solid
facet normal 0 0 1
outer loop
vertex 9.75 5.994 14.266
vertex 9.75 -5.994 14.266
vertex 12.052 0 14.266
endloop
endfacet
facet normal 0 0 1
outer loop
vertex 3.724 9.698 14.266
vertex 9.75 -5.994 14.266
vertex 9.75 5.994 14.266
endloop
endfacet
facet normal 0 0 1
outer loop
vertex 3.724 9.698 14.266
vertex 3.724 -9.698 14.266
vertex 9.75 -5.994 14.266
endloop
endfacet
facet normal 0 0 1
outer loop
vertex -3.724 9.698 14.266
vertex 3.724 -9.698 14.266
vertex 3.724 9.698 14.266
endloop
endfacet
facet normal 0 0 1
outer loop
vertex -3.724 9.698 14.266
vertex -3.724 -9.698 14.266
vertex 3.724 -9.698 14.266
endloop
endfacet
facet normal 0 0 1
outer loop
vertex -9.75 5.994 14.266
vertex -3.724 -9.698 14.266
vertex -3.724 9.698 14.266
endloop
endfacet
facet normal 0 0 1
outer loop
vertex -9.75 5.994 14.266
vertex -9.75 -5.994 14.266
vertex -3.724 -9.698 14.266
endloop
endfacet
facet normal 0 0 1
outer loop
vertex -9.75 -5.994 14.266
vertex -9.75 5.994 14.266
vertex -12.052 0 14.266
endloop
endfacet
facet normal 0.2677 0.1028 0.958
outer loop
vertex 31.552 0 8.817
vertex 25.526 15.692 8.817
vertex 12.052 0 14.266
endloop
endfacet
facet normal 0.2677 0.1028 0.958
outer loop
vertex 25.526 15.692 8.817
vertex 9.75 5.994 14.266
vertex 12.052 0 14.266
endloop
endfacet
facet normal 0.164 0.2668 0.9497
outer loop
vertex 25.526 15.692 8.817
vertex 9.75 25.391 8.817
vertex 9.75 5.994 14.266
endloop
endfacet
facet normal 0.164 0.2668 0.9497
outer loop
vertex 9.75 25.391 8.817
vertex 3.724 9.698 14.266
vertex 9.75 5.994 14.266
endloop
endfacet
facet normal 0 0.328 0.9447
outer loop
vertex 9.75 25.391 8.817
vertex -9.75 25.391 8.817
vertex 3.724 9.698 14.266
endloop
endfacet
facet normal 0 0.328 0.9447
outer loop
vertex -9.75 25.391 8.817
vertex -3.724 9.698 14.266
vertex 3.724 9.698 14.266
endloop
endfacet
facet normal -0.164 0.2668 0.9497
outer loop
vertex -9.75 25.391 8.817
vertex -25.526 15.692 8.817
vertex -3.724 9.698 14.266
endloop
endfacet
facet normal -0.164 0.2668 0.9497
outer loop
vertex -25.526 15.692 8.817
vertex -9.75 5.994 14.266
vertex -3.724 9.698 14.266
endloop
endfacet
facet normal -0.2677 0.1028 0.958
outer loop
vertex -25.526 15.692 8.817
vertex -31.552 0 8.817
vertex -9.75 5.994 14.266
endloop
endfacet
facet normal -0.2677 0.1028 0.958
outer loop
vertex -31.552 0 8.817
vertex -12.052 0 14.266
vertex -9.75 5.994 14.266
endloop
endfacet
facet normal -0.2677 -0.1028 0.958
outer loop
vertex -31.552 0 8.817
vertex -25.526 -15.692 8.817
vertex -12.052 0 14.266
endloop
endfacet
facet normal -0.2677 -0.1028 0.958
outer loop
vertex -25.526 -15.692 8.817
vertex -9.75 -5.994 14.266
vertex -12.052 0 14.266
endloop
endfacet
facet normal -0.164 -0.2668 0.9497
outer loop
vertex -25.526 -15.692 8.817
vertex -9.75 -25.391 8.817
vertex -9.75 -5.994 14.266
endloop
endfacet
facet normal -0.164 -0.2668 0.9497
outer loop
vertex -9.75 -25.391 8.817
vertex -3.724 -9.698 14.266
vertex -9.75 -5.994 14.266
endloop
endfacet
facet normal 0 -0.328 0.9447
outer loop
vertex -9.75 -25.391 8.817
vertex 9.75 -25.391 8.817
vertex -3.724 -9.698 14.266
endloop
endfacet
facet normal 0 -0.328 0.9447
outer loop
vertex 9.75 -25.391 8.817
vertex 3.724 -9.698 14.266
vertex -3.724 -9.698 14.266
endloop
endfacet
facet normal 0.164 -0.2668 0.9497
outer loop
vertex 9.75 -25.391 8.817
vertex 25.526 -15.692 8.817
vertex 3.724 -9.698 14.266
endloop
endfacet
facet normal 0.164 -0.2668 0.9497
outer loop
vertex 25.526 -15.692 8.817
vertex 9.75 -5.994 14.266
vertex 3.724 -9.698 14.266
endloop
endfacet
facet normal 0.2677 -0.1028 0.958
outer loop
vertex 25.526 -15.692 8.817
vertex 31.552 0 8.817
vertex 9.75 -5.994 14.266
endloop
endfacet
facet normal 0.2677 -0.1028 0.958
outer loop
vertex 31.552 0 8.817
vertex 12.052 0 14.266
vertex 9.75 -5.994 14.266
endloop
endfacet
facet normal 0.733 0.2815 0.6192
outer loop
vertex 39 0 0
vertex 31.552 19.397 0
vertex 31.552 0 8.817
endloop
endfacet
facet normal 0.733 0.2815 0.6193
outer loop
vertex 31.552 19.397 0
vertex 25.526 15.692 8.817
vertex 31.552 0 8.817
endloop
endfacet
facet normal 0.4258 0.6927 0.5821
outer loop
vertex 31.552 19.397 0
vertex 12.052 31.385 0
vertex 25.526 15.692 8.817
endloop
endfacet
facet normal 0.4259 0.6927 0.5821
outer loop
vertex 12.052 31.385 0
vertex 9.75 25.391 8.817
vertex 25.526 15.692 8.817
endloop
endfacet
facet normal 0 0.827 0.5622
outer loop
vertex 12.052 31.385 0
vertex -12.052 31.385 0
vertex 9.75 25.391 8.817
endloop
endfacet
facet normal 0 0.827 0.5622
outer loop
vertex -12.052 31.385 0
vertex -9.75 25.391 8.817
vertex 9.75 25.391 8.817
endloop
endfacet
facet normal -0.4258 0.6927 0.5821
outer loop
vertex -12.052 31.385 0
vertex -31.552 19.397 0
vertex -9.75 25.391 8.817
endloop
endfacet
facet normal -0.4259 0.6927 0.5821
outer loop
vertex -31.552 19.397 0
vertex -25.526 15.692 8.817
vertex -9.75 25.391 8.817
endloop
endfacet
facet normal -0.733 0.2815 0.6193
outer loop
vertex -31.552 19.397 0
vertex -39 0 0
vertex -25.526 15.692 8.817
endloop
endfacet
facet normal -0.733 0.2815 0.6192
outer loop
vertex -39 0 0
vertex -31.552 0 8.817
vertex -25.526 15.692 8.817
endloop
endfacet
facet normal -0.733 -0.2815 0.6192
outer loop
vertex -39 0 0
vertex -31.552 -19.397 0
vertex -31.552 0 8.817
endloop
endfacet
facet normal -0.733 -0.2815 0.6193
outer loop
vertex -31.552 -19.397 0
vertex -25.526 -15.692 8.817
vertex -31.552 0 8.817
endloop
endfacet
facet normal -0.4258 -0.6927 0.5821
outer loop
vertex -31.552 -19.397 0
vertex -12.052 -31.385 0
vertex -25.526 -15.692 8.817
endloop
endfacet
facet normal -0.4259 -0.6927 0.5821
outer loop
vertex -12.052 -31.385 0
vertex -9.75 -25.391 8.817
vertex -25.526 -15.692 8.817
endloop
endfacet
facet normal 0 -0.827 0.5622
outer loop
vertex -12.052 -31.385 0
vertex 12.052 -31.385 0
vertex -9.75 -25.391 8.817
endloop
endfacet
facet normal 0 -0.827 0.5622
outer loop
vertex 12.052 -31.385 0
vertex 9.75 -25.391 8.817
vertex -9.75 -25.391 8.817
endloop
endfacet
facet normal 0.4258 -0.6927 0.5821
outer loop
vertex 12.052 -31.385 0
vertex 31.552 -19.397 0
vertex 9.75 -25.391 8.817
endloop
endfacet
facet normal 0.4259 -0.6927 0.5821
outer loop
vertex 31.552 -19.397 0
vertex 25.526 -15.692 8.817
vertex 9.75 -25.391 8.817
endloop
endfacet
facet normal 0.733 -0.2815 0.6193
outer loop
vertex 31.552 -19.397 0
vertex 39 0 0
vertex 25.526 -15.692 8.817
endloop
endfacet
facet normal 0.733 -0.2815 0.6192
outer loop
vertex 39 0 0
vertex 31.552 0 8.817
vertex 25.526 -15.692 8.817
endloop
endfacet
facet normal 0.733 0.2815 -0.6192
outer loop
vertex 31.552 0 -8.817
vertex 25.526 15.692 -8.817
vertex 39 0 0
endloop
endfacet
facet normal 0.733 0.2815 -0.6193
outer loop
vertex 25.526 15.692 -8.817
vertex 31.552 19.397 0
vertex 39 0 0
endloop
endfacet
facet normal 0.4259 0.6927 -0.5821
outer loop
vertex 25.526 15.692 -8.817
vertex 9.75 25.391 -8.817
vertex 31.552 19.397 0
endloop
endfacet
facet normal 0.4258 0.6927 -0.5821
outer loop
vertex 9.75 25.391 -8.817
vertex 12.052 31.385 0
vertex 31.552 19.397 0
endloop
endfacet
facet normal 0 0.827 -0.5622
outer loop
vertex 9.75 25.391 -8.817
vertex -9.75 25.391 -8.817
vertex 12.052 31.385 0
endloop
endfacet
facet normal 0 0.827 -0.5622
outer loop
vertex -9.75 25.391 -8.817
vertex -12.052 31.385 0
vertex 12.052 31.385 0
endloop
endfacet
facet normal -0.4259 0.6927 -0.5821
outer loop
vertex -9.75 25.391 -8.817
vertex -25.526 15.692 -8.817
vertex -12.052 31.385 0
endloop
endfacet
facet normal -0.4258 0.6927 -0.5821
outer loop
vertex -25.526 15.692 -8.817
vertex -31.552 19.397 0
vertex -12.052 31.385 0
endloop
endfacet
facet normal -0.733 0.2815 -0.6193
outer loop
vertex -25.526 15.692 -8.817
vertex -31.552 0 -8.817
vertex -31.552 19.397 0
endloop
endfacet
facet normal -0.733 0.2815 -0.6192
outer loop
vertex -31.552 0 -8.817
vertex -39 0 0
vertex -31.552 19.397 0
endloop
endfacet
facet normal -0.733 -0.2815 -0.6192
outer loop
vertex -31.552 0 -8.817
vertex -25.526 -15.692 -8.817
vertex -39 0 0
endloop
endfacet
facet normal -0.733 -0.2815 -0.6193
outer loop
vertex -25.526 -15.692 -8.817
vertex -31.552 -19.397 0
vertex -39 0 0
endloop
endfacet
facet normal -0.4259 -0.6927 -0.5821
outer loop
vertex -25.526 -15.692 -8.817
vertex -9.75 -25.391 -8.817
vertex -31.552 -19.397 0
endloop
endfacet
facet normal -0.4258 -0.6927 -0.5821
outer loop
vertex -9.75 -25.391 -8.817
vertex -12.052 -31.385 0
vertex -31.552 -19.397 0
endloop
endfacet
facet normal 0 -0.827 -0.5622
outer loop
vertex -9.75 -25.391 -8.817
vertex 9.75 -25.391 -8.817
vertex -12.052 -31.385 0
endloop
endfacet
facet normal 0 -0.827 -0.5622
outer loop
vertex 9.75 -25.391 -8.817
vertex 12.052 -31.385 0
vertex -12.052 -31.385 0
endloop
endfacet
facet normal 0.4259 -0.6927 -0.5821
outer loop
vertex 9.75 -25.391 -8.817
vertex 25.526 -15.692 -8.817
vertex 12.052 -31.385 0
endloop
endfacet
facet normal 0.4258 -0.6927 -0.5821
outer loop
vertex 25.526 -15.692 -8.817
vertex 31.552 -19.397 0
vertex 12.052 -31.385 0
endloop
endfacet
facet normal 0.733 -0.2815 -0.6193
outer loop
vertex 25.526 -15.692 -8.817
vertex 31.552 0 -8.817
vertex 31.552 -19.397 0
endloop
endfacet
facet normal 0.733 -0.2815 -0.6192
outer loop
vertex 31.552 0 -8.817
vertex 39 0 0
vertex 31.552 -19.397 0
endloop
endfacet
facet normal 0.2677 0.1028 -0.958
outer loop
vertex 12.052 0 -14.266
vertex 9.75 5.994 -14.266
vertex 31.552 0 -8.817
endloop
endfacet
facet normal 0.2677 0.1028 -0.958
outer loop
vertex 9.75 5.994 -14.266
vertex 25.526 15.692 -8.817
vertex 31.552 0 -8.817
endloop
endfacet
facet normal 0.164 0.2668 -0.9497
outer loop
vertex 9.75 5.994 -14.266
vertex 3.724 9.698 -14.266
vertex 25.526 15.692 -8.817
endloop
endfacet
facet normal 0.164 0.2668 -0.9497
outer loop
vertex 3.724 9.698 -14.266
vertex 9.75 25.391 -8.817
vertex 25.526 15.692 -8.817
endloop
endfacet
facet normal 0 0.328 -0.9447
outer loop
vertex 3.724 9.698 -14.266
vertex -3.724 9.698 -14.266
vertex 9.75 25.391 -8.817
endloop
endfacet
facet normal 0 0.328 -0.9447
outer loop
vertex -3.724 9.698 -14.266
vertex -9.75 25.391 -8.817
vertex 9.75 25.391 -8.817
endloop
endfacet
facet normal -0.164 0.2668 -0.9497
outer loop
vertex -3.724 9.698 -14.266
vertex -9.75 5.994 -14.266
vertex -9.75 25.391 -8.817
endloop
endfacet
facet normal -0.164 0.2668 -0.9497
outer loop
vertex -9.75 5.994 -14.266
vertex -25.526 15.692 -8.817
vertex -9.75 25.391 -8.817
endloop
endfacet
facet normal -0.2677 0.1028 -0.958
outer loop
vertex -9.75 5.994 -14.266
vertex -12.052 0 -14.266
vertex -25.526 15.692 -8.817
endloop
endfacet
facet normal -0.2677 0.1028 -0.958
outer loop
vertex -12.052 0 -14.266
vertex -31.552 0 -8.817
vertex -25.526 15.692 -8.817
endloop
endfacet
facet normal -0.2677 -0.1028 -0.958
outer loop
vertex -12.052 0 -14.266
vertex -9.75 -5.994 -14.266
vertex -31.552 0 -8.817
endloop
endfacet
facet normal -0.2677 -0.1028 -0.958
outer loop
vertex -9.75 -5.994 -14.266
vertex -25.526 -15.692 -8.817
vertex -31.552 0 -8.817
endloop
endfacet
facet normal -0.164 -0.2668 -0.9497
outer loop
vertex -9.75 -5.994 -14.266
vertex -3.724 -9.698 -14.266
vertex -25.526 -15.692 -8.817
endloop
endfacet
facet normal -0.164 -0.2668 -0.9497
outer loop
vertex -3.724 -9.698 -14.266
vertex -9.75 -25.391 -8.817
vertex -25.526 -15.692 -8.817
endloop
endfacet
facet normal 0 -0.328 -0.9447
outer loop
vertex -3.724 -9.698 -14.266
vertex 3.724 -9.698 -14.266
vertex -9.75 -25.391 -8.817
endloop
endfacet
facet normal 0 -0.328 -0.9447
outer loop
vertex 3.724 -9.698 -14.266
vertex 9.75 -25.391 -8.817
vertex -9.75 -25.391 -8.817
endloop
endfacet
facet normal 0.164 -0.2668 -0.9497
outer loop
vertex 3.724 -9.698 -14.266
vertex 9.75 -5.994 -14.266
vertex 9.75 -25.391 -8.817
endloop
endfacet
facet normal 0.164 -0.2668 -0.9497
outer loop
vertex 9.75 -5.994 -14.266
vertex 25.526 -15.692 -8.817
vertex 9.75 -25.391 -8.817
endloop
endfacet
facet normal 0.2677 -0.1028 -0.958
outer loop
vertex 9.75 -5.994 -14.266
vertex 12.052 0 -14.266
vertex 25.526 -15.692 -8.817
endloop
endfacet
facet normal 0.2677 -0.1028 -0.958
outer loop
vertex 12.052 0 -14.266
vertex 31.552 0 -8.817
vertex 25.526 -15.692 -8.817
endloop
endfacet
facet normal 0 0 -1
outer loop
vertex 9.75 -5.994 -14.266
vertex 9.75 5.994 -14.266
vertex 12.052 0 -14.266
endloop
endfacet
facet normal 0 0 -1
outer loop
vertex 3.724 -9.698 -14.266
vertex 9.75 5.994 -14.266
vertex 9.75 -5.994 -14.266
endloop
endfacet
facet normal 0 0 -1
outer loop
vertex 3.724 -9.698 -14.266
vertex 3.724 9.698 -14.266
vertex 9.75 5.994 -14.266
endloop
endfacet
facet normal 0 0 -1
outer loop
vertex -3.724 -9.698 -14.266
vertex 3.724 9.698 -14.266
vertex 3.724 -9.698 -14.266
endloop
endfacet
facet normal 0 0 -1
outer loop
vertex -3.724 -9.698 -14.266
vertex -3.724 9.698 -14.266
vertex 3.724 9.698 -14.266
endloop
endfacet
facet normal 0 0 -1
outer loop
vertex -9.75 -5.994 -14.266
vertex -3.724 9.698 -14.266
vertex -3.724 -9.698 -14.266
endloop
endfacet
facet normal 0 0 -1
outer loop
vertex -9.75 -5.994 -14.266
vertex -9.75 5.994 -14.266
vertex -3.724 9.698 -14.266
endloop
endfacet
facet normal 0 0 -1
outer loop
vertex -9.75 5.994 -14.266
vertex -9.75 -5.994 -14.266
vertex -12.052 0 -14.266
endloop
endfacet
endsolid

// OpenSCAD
// Generated by SolidPython 1.0.1 on 2020-07-29 00:46:50


scale(v = [13, 11, 5]) {
	sphere(r = 3);
}
/***********************************************
*********      SolidPython code:      **********
************************************************
 
# import packages: SolidPython
from solid import *
from solid.utils import *
from itertools import chain, combinations, permutations


class Resize:

    def __init__(self, scad_file):
        self.scad_file = scad_file
        #self.scad_file = import_scad(scad_file)
        # cone/cylinder param:
        self.r1 = 0
        self.r2 = 0
        self.h = 0
        # rectangular prism param:
        self.w = 0
        self.l = 0
        # ellipse param:
        self.r = 0

    # import OpenScad code (file name corresponds to shape)


    # classify shape + parameters
    def assign(self, param1, param2, param3):
        if self.scad_file == 'cone.scad':
            self.r1 = param1
            self.r2 = param2
            self.h = param3
        elif self.scad_file == 'cylinder.scad':
            self.r1 = param1
            self.r2 = param2
            self.h = param3
        elif self.scad_file == 'rectangularPrism.scad':
            self.h = param1
            self.l = param2
            self.w = param3
        else:
            self.r = param1
            self.h = param2

    # resize parameters
    def iterate(self):
        x = range(3, 20, 2)
        i = 1
        if self.scad_file == 'cone.scad':
            tempList = list(permutations(x, 2))
            for temp in tempList:
                param1 = temp[0]
                param2 = temp[1]
                filepath = 'produced_scad_files/' + 'cone' + str(param1) + '_' + str(param2) + '_' + '.scad'
                scad_render_to_file(cylinder(h=param1, r1=param2, r2=0), filepath)

        elif self.scad_file == 'cylinder.scad':
            tempList = list(permutations(x, 3))
            for temp in tempList:
                param1 = temp[0]
                param2 = temp[1]
                filepath = 'produced_scad_files/' + 'cylinder' + str(param1) + '_' + str(param2) + '_' + '.scad'
                scad_render_to_file(cylinder(h=param1, r1=param2, r2=param2), filepath)

        elif self.scad_file == 'rectangularPrism.scad':
            tempList = list(permutations(x, 3))
            for temp in tempList:
                param1 = temp[0]
                param2 = temp[1]
                param3 = temp[2]
                filepath = 'produced_scad_files/' + 'rectangularPrism' + str(param1) + '_' + str(param2) + '_' + str(
                    param3) + '.scad'
                scad_render_to_file(cube(size=(param1, param2, param3)), filepath)

        elif self.scad_file == 'ellipse.scad':
            tempList = list(permutations(x, 4))
            for temp in tempList:
                param1 = temp[0]
                param2 = temp[1]
                param3 = temp[2]
                param4 = temp[3]
                filepath = 'produced_scad_files/' + 'ellipse' + str(param1) + '_' + str(param2) + '_' + str(param3) + '_' + str(param4) + '.scad'
                scad_render_to_file(scale([param1, param2, param3])(sphere(r=param4)), filepath)

    def render_to_scadfile(self):
        scad_render_to_file(scad, 'example.scad') 
 
************************************************/
